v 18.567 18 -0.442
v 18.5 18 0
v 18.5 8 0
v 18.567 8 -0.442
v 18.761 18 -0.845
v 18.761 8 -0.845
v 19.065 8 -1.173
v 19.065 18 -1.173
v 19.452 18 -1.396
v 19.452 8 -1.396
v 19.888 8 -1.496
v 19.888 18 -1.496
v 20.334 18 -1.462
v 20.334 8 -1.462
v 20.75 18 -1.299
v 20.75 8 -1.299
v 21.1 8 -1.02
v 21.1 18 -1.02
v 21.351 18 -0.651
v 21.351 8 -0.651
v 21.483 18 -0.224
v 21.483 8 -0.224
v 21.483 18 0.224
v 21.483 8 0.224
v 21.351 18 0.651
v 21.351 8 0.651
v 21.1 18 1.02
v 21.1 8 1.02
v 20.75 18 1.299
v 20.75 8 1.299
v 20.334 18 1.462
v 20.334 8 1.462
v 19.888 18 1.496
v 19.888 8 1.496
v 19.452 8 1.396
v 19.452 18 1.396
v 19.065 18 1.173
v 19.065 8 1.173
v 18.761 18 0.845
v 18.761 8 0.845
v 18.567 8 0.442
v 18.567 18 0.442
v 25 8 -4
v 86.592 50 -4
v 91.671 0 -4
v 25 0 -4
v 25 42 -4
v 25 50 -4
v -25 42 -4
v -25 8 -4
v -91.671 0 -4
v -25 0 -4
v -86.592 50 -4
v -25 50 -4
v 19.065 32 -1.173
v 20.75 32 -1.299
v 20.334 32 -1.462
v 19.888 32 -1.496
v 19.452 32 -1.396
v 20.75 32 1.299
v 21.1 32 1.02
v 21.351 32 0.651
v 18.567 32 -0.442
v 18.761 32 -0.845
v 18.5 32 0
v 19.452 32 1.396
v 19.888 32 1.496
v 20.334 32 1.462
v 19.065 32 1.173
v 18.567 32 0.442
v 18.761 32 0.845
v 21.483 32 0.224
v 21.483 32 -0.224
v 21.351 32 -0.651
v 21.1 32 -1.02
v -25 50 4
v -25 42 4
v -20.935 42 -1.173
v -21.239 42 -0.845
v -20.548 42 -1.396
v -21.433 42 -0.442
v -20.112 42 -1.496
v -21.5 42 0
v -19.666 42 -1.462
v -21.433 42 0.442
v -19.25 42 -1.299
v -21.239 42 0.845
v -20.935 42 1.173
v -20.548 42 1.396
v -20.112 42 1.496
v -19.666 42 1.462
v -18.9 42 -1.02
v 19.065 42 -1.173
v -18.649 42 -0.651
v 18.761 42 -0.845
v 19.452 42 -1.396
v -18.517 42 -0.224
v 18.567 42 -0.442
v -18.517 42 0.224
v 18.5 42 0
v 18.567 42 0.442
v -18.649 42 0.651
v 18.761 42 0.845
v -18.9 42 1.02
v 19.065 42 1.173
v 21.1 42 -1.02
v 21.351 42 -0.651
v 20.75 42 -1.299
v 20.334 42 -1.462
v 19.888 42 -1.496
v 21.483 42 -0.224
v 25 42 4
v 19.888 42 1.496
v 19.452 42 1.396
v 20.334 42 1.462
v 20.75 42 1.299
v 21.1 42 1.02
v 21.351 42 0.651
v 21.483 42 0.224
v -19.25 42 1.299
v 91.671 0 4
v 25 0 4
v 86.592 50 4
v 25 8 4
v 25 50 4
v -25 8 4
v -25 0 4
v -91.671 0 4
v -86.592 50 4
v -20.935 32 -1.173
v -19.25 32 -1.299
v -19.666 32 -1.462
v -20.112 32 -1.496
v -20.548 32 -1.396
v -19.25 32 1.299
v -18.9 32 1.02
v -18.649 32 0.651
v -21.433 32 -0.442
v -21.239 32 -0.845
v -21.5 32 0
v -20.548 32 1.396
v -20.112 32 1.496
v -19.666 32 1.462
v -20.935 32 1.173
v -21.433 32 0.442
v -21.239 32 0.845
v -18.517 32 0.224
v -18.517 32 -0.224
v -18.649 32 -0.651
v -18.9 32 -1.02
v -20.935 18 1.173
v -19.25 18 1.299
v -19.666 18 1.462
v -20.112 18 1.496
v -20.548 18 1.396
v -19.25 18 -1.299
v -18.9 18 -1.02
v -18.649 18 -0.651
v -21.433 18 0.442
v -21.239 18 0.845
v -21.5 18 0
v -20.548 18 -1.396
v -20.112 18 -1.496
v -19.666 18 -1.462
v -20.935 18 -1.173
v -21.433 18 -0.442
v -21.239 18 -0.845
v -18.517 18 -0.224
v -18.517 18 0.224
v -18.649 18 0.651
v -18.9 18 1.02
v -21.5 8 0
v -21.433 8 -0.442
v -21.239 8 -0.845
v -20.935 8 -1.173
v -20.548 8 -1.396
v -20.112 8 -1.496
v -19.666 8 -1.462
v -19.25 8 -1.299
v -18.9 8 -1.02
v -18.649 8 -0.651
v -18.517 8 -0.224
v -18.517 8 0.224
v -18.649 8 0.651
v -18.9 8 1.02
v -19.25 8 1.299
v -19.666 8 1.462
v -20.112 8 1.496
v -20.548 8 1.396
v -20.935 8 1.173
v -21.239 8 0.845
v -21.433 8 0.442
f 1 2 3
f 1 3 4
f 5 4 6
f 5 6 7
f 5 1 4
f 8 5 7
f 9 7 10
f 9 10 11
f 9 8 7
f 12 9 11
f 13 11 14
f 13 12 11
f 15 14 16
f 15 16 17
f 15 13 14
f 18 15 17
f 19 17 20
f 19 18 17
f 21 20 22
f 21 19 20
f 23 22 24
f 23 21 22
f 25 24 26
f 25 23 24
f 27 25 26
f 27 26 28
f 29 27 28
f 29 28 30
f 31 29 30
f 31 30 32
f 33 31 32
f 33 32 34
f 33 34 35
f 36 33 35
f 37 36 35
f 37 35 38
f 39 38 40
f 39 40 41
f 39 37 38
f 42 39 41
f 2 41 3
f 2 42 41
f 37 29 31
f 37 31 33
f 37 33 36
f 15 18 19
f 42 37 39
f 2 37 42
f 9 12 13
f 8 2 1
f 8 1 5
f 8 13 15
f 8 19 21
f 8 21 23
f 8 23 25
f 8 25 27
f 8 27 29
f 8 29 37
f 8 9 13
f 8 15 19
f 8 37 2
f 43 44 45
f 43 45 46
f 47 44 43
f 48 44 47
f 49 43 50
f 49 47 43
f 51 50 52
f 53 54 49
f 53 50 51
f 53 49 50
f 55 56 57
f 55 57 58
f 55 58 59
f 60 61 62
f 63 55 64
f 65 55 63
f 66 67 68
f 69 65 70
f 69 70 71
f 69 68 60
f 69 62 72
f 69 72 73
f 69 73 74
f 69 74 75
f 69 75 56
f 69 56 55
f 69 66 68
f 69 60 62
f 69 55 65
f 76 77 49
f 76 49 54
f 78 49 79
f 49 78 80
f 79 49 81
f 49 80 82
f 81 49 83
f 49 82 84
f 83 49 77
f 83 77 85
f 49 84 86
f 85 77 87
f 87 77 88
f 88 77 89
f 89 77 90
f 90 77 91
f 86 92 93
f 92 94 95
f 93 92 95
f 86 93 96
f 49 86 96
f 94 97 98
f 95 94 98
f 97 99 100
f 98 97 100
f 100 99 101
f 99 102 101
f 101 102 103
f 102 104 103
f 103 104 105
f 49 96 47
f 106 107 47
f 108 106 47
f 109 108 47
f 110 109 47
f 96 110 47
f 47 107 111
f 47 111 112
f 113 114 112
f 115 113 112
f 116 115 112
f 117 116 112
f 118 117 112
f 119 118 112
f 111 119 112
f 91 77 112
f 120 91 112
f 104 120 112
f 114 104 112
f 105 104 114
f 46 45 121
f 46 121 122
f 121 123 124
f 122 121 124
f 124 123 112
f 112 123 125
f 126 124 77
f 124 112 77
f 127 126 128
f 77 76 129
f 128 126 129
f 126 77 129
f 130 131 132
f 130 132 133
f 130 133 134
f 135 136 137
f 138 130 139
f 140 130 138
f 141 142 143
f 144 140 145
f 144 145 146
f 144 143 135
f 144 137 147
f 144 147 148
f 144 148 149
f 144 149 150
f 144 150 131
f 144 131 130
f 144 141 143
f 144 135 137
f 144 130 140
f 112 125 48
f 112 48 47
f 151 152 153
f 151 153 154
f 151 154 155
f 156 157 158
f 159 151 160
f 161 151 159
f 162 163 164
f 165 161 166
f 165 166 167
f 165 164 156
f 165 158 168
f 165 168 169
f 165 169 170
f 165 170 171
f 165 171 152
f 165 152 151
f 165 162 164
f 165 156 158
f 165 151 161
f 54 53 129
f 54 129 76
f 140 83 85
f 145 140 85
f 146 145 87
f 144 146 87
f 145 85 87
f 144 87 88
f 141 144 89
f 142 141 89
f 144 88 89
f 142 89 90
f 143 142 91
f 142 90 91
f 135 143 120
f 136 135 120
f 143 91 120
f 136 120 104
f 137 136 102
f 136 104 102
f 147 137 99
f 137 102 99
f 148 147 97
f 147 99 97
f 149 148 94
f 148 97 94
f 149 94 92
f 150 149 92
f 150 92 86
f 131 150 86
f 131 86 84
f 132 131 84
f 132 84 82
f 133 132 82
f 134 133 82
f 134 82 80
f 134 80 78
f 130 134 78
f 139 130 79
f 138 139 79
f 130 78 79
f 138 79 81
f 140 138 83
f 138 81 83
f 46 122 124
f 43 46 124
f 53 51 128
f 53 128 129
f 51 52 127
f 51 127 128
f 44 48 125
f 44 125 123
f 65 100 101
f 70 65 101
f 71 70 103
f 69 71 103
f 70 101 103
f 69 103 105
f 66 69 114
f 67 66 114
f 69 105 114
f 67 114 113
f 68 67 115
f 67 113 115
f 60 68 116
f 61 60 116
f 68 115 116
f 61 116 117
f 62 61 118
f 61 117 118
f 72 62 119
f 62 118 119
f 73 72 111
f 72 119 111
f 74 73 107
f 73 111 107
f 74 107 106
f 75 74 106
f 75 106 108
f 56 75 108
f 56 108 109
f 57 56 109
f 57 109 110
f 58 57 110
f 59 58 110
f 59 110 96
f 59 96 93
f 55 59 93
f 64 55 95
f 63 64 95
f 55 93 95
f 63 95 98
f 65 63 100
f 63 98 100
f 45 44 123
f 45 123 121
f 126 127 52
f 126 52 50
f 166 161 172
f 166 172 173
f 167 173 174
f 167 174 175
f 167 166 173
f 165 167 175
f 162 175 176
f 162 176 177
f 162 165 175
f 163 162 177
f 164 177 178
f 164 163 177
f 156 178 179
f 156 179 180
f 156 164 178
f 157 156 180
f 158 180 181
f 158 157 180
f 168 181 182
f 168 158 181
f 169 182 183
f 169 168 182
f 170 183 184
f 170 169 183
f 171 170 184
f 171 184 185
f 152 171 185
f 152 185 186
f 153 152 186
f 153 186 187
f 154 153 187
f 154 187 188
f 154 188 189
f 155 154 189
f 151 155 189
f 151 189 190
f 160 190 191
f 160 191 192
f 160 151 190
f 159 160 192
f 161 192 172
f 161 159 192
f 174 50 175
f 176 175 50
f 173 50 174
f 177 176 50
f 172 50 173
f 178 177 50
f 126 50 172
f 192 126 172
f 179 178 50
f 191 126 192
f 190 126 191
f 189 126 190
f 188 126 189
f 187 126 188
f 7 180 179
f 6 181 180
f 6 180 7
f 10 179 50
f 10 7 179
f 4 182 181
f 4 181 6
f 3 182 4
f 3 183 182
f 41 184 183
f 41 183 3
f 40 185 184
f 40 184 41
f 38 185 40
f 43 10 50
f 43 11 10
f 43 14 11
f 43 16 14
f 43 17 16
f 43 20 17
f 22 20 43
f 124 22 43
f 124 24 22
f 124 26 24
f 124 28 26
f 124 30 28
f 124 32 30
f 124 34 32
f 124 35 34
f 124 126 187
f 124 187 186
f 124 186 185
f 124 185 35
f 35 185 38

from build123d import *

# Parameters (mm, degrees)
SIDE_BOSS_EXTRUDE1_DEPTH                 = 4
SIDE_BOSS_EXTRUDE1_DEPTH_BACK            = 4
SKETCH3_W                                = 50
SKETCH3_H                                = 8
SOCKET_TOP_AND_BOTTOM_CUT_EXTRUDE1_DEPTH = 8
SKETCH4_R                                = 1.5
MOUNTING_HOLES_TOP_CUT_EXTRUDE2_DEPTH    = 10
MOUNTING_START                           = -10
SKETCH5_R                                = 1.5
MOUNTING_HOLES_BOTTOM_CUT_EXTRUDE3_DEPTH = 10


with BuildPart() as part:
    # Sketch2 → Side Boss-Extrude1 (new, two sides: drawn at the far end of the back side and taken through both)
    with BuildSketch(Plane.XY.offset(-SIDE_BOSS_EXTRUDE1_DEPTH_BACK)):
        Polygon((-86.592068141, 50), (86.592068141, 50), (91.670882932, 0), (-91.670882932, 0), align=None)
    extrude(amount=SIDE_BOSS_EXTRUDE1_DEPTH + SIDE_BOSS_EXTRUDE1_DEPTH_BACK)

    # Sketch3 → Socket Top And Bottom Cut-Extrude1 (cut)
    with BuildSketch(Plane.XY.offset(4)):
        with Locations((0, 4)):
            Rectangle(SKETCH3_W, SKETCH3_H)
        Polygon((25, 42), (0, 42), (-25, 42), (-25, 50), (25, 50), align=None)
    extrude(amount=-SOCKET_TOP_AND_BOTTOM_CUT_EXTRUDE1_DEPTH, mode=Mode.SUBTRACT)

    # Sketch4 → Mounting Holes Top Cut-Extrude2 (cut)
    with BuildSketch(Plane(origin=(0, 42, 0), x_dir=(1, 0, 0), z_dir=(0, 1, 0))):
        with Locations(Location((20, 0, 0), (0, 0, 180))):
            Circle(SKETCH4_R)
        with Locations(Location((-20, 0, 0), (0, 0, 180))):
            Circle(SKETCH4_R)
    extrude(amount=-MOUNTING_HOLES_TOP_CUT_EXTRUDE2_DEPTH, mode=Mode.SUBTRACT)

    # Sketch5 → Mounting Holes Bottom Cut-Extrude3 (cut)
    with BuildSketch(Plane.XZ.offset(-8).offset(MOUNTING_START)):
        with Locations(Location((20, 0, 0), (0, 0, 180))):
            Circle(SKETCH5_R)
        with Locations(Location((-20, 0, 0), (0, 0, 180))):
            Circle(SKETCH5_R)
    extrude(amount=MOUNTING_HOLES_BOTTOM_CUT_EXTRUDE3_DEPTH, mode=Mode.SUBTRACT)


solid = part.part
